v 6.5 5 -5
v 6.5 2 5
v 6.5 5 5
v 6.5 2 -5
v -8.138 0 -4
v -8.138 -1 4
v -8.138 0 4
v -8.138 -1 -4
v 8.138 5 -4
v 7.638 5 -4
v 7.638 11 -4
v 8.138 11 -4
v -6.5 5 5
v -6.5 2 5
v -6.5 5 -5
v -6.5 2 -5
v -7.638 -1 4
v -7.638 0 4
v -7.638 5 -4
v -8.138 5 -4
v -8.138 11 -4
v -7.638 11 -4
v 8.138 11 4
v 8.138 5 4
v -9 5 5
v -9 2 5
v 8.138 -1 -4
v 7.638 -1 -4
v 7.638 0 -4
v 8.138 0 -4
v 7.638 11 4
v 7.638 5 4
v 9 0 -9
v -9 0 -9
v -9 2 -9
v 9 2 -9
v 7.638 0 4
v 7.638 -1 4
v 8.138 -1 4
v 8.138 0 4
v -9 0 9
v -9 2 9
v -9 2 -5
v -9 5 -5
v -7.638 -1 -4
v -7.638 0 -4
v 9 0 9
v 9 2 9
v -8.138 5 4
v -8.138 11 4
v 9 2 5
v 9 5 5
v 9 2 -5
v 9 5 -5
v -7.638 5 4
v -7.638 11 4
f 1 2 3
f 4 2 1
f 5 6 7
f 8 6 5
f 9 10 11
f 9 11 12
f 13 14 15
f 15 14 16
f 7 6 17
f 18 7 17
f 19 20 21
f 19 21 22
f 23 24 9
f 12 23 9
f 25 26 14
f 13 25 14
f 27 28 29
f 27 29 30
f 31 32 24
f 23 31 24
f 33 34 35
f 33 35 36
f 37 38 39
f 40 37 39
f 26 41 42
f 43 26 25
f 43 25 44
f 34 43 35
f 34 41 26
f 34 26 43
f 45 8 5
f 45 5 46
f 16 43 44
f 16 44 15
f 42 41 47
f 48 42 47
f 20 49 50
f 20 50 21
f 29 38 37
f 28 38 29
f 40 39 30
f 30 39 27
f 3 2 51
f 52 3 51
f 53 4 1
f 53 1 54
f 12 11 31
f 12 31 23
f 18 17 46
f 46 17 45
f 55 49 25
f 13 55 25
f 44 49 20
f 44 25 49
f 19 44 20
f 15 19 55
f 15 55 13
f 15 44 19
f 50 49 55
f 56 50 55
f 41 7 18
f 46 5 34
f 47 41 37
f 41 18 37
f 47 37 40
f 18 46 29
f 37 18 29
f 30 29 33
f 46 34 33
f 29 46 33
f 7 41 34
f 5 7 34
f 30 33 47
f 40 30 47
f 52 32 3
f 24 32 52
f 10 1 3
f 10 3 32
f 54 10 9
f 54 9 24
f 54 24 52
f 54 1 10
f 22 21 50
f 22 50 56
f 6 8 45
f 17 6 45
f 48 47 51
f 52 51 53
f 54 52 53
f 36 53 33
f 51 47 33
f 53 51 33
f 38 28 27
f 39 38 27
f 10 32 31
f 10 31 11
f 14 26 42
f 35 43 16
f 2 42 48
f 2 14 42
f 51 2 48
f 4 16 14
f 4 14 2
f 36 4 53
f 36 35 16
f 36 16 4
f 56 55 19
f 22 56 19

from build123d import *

# Parameters (mm, degrees)
SKETCH1_W                = 18
SKETCH1_H                = 18
BOSS_EXTRUDE1_DEPTH      = 2
SKETCH2_W                = 2.5
SKETCH2_H                = 10
BOSS_EXTRUDE2_DEPTH      = 3
BOSS_EXTRUDE3_DEPTH      = 6
BOSS_EXTRUDE3_DEPTH_BACK = 6
SKETCH3_W                = 0.5
SKETCH3_H                = 8


with BuildPart() as part:
    # Sketch1 → Boss-Extrude1 (new body)
    with BuildSketch(Plane(origin=(0, 0, 0), x_dir=(1, 0, 0), z_dir=(0, 1, 0))):
        Rectangle(SKETCH1_W, SKETCH1_H)
    extrude(amount=BOSS_EXTRUDE1_DEPTH)

    # Sketch2 → Boss-Extrude2 (add)
    with BuildSketch(Plane(origin=(0, 2, 0), x_dir=(1, 0, 0), z_dir=(0, 1, 0))):
        with Locations((-7.75, 0)):
            Rectangle(SKETCH2_W, SKETCH2_H)
        with Locations((7.75, 0)):
            Rectangle(SKETCH2_W, SKETCH2_H)
    extrude(amount=BOSS_EXTRUDE2_DEPTH)

    # Sketch3 → Boss-Extrude3 (add, two sides: drawn at the far end of the back side and taken through both)
    with BuildSketch(Plane(origin=(0, 5, 0), x_dir=(1, 0, 0), z_dir=(0, 1, 0)).offset(-BOSS_EXTRUDE3_DEPTH_BACK)):
        with Locations((-7.887555613, 0)):
            Rectangle(SKETCH3_W, SKETCH3_H)
        with Locations((7.887555613, 0)):
            Rectangle(SKETCH3_W, SKETCH3_H)
    extrude(amount=BOSS_EXTRUDE3_DEPTH + BOSS_EXTRUDE3_DEPTH_BACK)


solid = part.part
